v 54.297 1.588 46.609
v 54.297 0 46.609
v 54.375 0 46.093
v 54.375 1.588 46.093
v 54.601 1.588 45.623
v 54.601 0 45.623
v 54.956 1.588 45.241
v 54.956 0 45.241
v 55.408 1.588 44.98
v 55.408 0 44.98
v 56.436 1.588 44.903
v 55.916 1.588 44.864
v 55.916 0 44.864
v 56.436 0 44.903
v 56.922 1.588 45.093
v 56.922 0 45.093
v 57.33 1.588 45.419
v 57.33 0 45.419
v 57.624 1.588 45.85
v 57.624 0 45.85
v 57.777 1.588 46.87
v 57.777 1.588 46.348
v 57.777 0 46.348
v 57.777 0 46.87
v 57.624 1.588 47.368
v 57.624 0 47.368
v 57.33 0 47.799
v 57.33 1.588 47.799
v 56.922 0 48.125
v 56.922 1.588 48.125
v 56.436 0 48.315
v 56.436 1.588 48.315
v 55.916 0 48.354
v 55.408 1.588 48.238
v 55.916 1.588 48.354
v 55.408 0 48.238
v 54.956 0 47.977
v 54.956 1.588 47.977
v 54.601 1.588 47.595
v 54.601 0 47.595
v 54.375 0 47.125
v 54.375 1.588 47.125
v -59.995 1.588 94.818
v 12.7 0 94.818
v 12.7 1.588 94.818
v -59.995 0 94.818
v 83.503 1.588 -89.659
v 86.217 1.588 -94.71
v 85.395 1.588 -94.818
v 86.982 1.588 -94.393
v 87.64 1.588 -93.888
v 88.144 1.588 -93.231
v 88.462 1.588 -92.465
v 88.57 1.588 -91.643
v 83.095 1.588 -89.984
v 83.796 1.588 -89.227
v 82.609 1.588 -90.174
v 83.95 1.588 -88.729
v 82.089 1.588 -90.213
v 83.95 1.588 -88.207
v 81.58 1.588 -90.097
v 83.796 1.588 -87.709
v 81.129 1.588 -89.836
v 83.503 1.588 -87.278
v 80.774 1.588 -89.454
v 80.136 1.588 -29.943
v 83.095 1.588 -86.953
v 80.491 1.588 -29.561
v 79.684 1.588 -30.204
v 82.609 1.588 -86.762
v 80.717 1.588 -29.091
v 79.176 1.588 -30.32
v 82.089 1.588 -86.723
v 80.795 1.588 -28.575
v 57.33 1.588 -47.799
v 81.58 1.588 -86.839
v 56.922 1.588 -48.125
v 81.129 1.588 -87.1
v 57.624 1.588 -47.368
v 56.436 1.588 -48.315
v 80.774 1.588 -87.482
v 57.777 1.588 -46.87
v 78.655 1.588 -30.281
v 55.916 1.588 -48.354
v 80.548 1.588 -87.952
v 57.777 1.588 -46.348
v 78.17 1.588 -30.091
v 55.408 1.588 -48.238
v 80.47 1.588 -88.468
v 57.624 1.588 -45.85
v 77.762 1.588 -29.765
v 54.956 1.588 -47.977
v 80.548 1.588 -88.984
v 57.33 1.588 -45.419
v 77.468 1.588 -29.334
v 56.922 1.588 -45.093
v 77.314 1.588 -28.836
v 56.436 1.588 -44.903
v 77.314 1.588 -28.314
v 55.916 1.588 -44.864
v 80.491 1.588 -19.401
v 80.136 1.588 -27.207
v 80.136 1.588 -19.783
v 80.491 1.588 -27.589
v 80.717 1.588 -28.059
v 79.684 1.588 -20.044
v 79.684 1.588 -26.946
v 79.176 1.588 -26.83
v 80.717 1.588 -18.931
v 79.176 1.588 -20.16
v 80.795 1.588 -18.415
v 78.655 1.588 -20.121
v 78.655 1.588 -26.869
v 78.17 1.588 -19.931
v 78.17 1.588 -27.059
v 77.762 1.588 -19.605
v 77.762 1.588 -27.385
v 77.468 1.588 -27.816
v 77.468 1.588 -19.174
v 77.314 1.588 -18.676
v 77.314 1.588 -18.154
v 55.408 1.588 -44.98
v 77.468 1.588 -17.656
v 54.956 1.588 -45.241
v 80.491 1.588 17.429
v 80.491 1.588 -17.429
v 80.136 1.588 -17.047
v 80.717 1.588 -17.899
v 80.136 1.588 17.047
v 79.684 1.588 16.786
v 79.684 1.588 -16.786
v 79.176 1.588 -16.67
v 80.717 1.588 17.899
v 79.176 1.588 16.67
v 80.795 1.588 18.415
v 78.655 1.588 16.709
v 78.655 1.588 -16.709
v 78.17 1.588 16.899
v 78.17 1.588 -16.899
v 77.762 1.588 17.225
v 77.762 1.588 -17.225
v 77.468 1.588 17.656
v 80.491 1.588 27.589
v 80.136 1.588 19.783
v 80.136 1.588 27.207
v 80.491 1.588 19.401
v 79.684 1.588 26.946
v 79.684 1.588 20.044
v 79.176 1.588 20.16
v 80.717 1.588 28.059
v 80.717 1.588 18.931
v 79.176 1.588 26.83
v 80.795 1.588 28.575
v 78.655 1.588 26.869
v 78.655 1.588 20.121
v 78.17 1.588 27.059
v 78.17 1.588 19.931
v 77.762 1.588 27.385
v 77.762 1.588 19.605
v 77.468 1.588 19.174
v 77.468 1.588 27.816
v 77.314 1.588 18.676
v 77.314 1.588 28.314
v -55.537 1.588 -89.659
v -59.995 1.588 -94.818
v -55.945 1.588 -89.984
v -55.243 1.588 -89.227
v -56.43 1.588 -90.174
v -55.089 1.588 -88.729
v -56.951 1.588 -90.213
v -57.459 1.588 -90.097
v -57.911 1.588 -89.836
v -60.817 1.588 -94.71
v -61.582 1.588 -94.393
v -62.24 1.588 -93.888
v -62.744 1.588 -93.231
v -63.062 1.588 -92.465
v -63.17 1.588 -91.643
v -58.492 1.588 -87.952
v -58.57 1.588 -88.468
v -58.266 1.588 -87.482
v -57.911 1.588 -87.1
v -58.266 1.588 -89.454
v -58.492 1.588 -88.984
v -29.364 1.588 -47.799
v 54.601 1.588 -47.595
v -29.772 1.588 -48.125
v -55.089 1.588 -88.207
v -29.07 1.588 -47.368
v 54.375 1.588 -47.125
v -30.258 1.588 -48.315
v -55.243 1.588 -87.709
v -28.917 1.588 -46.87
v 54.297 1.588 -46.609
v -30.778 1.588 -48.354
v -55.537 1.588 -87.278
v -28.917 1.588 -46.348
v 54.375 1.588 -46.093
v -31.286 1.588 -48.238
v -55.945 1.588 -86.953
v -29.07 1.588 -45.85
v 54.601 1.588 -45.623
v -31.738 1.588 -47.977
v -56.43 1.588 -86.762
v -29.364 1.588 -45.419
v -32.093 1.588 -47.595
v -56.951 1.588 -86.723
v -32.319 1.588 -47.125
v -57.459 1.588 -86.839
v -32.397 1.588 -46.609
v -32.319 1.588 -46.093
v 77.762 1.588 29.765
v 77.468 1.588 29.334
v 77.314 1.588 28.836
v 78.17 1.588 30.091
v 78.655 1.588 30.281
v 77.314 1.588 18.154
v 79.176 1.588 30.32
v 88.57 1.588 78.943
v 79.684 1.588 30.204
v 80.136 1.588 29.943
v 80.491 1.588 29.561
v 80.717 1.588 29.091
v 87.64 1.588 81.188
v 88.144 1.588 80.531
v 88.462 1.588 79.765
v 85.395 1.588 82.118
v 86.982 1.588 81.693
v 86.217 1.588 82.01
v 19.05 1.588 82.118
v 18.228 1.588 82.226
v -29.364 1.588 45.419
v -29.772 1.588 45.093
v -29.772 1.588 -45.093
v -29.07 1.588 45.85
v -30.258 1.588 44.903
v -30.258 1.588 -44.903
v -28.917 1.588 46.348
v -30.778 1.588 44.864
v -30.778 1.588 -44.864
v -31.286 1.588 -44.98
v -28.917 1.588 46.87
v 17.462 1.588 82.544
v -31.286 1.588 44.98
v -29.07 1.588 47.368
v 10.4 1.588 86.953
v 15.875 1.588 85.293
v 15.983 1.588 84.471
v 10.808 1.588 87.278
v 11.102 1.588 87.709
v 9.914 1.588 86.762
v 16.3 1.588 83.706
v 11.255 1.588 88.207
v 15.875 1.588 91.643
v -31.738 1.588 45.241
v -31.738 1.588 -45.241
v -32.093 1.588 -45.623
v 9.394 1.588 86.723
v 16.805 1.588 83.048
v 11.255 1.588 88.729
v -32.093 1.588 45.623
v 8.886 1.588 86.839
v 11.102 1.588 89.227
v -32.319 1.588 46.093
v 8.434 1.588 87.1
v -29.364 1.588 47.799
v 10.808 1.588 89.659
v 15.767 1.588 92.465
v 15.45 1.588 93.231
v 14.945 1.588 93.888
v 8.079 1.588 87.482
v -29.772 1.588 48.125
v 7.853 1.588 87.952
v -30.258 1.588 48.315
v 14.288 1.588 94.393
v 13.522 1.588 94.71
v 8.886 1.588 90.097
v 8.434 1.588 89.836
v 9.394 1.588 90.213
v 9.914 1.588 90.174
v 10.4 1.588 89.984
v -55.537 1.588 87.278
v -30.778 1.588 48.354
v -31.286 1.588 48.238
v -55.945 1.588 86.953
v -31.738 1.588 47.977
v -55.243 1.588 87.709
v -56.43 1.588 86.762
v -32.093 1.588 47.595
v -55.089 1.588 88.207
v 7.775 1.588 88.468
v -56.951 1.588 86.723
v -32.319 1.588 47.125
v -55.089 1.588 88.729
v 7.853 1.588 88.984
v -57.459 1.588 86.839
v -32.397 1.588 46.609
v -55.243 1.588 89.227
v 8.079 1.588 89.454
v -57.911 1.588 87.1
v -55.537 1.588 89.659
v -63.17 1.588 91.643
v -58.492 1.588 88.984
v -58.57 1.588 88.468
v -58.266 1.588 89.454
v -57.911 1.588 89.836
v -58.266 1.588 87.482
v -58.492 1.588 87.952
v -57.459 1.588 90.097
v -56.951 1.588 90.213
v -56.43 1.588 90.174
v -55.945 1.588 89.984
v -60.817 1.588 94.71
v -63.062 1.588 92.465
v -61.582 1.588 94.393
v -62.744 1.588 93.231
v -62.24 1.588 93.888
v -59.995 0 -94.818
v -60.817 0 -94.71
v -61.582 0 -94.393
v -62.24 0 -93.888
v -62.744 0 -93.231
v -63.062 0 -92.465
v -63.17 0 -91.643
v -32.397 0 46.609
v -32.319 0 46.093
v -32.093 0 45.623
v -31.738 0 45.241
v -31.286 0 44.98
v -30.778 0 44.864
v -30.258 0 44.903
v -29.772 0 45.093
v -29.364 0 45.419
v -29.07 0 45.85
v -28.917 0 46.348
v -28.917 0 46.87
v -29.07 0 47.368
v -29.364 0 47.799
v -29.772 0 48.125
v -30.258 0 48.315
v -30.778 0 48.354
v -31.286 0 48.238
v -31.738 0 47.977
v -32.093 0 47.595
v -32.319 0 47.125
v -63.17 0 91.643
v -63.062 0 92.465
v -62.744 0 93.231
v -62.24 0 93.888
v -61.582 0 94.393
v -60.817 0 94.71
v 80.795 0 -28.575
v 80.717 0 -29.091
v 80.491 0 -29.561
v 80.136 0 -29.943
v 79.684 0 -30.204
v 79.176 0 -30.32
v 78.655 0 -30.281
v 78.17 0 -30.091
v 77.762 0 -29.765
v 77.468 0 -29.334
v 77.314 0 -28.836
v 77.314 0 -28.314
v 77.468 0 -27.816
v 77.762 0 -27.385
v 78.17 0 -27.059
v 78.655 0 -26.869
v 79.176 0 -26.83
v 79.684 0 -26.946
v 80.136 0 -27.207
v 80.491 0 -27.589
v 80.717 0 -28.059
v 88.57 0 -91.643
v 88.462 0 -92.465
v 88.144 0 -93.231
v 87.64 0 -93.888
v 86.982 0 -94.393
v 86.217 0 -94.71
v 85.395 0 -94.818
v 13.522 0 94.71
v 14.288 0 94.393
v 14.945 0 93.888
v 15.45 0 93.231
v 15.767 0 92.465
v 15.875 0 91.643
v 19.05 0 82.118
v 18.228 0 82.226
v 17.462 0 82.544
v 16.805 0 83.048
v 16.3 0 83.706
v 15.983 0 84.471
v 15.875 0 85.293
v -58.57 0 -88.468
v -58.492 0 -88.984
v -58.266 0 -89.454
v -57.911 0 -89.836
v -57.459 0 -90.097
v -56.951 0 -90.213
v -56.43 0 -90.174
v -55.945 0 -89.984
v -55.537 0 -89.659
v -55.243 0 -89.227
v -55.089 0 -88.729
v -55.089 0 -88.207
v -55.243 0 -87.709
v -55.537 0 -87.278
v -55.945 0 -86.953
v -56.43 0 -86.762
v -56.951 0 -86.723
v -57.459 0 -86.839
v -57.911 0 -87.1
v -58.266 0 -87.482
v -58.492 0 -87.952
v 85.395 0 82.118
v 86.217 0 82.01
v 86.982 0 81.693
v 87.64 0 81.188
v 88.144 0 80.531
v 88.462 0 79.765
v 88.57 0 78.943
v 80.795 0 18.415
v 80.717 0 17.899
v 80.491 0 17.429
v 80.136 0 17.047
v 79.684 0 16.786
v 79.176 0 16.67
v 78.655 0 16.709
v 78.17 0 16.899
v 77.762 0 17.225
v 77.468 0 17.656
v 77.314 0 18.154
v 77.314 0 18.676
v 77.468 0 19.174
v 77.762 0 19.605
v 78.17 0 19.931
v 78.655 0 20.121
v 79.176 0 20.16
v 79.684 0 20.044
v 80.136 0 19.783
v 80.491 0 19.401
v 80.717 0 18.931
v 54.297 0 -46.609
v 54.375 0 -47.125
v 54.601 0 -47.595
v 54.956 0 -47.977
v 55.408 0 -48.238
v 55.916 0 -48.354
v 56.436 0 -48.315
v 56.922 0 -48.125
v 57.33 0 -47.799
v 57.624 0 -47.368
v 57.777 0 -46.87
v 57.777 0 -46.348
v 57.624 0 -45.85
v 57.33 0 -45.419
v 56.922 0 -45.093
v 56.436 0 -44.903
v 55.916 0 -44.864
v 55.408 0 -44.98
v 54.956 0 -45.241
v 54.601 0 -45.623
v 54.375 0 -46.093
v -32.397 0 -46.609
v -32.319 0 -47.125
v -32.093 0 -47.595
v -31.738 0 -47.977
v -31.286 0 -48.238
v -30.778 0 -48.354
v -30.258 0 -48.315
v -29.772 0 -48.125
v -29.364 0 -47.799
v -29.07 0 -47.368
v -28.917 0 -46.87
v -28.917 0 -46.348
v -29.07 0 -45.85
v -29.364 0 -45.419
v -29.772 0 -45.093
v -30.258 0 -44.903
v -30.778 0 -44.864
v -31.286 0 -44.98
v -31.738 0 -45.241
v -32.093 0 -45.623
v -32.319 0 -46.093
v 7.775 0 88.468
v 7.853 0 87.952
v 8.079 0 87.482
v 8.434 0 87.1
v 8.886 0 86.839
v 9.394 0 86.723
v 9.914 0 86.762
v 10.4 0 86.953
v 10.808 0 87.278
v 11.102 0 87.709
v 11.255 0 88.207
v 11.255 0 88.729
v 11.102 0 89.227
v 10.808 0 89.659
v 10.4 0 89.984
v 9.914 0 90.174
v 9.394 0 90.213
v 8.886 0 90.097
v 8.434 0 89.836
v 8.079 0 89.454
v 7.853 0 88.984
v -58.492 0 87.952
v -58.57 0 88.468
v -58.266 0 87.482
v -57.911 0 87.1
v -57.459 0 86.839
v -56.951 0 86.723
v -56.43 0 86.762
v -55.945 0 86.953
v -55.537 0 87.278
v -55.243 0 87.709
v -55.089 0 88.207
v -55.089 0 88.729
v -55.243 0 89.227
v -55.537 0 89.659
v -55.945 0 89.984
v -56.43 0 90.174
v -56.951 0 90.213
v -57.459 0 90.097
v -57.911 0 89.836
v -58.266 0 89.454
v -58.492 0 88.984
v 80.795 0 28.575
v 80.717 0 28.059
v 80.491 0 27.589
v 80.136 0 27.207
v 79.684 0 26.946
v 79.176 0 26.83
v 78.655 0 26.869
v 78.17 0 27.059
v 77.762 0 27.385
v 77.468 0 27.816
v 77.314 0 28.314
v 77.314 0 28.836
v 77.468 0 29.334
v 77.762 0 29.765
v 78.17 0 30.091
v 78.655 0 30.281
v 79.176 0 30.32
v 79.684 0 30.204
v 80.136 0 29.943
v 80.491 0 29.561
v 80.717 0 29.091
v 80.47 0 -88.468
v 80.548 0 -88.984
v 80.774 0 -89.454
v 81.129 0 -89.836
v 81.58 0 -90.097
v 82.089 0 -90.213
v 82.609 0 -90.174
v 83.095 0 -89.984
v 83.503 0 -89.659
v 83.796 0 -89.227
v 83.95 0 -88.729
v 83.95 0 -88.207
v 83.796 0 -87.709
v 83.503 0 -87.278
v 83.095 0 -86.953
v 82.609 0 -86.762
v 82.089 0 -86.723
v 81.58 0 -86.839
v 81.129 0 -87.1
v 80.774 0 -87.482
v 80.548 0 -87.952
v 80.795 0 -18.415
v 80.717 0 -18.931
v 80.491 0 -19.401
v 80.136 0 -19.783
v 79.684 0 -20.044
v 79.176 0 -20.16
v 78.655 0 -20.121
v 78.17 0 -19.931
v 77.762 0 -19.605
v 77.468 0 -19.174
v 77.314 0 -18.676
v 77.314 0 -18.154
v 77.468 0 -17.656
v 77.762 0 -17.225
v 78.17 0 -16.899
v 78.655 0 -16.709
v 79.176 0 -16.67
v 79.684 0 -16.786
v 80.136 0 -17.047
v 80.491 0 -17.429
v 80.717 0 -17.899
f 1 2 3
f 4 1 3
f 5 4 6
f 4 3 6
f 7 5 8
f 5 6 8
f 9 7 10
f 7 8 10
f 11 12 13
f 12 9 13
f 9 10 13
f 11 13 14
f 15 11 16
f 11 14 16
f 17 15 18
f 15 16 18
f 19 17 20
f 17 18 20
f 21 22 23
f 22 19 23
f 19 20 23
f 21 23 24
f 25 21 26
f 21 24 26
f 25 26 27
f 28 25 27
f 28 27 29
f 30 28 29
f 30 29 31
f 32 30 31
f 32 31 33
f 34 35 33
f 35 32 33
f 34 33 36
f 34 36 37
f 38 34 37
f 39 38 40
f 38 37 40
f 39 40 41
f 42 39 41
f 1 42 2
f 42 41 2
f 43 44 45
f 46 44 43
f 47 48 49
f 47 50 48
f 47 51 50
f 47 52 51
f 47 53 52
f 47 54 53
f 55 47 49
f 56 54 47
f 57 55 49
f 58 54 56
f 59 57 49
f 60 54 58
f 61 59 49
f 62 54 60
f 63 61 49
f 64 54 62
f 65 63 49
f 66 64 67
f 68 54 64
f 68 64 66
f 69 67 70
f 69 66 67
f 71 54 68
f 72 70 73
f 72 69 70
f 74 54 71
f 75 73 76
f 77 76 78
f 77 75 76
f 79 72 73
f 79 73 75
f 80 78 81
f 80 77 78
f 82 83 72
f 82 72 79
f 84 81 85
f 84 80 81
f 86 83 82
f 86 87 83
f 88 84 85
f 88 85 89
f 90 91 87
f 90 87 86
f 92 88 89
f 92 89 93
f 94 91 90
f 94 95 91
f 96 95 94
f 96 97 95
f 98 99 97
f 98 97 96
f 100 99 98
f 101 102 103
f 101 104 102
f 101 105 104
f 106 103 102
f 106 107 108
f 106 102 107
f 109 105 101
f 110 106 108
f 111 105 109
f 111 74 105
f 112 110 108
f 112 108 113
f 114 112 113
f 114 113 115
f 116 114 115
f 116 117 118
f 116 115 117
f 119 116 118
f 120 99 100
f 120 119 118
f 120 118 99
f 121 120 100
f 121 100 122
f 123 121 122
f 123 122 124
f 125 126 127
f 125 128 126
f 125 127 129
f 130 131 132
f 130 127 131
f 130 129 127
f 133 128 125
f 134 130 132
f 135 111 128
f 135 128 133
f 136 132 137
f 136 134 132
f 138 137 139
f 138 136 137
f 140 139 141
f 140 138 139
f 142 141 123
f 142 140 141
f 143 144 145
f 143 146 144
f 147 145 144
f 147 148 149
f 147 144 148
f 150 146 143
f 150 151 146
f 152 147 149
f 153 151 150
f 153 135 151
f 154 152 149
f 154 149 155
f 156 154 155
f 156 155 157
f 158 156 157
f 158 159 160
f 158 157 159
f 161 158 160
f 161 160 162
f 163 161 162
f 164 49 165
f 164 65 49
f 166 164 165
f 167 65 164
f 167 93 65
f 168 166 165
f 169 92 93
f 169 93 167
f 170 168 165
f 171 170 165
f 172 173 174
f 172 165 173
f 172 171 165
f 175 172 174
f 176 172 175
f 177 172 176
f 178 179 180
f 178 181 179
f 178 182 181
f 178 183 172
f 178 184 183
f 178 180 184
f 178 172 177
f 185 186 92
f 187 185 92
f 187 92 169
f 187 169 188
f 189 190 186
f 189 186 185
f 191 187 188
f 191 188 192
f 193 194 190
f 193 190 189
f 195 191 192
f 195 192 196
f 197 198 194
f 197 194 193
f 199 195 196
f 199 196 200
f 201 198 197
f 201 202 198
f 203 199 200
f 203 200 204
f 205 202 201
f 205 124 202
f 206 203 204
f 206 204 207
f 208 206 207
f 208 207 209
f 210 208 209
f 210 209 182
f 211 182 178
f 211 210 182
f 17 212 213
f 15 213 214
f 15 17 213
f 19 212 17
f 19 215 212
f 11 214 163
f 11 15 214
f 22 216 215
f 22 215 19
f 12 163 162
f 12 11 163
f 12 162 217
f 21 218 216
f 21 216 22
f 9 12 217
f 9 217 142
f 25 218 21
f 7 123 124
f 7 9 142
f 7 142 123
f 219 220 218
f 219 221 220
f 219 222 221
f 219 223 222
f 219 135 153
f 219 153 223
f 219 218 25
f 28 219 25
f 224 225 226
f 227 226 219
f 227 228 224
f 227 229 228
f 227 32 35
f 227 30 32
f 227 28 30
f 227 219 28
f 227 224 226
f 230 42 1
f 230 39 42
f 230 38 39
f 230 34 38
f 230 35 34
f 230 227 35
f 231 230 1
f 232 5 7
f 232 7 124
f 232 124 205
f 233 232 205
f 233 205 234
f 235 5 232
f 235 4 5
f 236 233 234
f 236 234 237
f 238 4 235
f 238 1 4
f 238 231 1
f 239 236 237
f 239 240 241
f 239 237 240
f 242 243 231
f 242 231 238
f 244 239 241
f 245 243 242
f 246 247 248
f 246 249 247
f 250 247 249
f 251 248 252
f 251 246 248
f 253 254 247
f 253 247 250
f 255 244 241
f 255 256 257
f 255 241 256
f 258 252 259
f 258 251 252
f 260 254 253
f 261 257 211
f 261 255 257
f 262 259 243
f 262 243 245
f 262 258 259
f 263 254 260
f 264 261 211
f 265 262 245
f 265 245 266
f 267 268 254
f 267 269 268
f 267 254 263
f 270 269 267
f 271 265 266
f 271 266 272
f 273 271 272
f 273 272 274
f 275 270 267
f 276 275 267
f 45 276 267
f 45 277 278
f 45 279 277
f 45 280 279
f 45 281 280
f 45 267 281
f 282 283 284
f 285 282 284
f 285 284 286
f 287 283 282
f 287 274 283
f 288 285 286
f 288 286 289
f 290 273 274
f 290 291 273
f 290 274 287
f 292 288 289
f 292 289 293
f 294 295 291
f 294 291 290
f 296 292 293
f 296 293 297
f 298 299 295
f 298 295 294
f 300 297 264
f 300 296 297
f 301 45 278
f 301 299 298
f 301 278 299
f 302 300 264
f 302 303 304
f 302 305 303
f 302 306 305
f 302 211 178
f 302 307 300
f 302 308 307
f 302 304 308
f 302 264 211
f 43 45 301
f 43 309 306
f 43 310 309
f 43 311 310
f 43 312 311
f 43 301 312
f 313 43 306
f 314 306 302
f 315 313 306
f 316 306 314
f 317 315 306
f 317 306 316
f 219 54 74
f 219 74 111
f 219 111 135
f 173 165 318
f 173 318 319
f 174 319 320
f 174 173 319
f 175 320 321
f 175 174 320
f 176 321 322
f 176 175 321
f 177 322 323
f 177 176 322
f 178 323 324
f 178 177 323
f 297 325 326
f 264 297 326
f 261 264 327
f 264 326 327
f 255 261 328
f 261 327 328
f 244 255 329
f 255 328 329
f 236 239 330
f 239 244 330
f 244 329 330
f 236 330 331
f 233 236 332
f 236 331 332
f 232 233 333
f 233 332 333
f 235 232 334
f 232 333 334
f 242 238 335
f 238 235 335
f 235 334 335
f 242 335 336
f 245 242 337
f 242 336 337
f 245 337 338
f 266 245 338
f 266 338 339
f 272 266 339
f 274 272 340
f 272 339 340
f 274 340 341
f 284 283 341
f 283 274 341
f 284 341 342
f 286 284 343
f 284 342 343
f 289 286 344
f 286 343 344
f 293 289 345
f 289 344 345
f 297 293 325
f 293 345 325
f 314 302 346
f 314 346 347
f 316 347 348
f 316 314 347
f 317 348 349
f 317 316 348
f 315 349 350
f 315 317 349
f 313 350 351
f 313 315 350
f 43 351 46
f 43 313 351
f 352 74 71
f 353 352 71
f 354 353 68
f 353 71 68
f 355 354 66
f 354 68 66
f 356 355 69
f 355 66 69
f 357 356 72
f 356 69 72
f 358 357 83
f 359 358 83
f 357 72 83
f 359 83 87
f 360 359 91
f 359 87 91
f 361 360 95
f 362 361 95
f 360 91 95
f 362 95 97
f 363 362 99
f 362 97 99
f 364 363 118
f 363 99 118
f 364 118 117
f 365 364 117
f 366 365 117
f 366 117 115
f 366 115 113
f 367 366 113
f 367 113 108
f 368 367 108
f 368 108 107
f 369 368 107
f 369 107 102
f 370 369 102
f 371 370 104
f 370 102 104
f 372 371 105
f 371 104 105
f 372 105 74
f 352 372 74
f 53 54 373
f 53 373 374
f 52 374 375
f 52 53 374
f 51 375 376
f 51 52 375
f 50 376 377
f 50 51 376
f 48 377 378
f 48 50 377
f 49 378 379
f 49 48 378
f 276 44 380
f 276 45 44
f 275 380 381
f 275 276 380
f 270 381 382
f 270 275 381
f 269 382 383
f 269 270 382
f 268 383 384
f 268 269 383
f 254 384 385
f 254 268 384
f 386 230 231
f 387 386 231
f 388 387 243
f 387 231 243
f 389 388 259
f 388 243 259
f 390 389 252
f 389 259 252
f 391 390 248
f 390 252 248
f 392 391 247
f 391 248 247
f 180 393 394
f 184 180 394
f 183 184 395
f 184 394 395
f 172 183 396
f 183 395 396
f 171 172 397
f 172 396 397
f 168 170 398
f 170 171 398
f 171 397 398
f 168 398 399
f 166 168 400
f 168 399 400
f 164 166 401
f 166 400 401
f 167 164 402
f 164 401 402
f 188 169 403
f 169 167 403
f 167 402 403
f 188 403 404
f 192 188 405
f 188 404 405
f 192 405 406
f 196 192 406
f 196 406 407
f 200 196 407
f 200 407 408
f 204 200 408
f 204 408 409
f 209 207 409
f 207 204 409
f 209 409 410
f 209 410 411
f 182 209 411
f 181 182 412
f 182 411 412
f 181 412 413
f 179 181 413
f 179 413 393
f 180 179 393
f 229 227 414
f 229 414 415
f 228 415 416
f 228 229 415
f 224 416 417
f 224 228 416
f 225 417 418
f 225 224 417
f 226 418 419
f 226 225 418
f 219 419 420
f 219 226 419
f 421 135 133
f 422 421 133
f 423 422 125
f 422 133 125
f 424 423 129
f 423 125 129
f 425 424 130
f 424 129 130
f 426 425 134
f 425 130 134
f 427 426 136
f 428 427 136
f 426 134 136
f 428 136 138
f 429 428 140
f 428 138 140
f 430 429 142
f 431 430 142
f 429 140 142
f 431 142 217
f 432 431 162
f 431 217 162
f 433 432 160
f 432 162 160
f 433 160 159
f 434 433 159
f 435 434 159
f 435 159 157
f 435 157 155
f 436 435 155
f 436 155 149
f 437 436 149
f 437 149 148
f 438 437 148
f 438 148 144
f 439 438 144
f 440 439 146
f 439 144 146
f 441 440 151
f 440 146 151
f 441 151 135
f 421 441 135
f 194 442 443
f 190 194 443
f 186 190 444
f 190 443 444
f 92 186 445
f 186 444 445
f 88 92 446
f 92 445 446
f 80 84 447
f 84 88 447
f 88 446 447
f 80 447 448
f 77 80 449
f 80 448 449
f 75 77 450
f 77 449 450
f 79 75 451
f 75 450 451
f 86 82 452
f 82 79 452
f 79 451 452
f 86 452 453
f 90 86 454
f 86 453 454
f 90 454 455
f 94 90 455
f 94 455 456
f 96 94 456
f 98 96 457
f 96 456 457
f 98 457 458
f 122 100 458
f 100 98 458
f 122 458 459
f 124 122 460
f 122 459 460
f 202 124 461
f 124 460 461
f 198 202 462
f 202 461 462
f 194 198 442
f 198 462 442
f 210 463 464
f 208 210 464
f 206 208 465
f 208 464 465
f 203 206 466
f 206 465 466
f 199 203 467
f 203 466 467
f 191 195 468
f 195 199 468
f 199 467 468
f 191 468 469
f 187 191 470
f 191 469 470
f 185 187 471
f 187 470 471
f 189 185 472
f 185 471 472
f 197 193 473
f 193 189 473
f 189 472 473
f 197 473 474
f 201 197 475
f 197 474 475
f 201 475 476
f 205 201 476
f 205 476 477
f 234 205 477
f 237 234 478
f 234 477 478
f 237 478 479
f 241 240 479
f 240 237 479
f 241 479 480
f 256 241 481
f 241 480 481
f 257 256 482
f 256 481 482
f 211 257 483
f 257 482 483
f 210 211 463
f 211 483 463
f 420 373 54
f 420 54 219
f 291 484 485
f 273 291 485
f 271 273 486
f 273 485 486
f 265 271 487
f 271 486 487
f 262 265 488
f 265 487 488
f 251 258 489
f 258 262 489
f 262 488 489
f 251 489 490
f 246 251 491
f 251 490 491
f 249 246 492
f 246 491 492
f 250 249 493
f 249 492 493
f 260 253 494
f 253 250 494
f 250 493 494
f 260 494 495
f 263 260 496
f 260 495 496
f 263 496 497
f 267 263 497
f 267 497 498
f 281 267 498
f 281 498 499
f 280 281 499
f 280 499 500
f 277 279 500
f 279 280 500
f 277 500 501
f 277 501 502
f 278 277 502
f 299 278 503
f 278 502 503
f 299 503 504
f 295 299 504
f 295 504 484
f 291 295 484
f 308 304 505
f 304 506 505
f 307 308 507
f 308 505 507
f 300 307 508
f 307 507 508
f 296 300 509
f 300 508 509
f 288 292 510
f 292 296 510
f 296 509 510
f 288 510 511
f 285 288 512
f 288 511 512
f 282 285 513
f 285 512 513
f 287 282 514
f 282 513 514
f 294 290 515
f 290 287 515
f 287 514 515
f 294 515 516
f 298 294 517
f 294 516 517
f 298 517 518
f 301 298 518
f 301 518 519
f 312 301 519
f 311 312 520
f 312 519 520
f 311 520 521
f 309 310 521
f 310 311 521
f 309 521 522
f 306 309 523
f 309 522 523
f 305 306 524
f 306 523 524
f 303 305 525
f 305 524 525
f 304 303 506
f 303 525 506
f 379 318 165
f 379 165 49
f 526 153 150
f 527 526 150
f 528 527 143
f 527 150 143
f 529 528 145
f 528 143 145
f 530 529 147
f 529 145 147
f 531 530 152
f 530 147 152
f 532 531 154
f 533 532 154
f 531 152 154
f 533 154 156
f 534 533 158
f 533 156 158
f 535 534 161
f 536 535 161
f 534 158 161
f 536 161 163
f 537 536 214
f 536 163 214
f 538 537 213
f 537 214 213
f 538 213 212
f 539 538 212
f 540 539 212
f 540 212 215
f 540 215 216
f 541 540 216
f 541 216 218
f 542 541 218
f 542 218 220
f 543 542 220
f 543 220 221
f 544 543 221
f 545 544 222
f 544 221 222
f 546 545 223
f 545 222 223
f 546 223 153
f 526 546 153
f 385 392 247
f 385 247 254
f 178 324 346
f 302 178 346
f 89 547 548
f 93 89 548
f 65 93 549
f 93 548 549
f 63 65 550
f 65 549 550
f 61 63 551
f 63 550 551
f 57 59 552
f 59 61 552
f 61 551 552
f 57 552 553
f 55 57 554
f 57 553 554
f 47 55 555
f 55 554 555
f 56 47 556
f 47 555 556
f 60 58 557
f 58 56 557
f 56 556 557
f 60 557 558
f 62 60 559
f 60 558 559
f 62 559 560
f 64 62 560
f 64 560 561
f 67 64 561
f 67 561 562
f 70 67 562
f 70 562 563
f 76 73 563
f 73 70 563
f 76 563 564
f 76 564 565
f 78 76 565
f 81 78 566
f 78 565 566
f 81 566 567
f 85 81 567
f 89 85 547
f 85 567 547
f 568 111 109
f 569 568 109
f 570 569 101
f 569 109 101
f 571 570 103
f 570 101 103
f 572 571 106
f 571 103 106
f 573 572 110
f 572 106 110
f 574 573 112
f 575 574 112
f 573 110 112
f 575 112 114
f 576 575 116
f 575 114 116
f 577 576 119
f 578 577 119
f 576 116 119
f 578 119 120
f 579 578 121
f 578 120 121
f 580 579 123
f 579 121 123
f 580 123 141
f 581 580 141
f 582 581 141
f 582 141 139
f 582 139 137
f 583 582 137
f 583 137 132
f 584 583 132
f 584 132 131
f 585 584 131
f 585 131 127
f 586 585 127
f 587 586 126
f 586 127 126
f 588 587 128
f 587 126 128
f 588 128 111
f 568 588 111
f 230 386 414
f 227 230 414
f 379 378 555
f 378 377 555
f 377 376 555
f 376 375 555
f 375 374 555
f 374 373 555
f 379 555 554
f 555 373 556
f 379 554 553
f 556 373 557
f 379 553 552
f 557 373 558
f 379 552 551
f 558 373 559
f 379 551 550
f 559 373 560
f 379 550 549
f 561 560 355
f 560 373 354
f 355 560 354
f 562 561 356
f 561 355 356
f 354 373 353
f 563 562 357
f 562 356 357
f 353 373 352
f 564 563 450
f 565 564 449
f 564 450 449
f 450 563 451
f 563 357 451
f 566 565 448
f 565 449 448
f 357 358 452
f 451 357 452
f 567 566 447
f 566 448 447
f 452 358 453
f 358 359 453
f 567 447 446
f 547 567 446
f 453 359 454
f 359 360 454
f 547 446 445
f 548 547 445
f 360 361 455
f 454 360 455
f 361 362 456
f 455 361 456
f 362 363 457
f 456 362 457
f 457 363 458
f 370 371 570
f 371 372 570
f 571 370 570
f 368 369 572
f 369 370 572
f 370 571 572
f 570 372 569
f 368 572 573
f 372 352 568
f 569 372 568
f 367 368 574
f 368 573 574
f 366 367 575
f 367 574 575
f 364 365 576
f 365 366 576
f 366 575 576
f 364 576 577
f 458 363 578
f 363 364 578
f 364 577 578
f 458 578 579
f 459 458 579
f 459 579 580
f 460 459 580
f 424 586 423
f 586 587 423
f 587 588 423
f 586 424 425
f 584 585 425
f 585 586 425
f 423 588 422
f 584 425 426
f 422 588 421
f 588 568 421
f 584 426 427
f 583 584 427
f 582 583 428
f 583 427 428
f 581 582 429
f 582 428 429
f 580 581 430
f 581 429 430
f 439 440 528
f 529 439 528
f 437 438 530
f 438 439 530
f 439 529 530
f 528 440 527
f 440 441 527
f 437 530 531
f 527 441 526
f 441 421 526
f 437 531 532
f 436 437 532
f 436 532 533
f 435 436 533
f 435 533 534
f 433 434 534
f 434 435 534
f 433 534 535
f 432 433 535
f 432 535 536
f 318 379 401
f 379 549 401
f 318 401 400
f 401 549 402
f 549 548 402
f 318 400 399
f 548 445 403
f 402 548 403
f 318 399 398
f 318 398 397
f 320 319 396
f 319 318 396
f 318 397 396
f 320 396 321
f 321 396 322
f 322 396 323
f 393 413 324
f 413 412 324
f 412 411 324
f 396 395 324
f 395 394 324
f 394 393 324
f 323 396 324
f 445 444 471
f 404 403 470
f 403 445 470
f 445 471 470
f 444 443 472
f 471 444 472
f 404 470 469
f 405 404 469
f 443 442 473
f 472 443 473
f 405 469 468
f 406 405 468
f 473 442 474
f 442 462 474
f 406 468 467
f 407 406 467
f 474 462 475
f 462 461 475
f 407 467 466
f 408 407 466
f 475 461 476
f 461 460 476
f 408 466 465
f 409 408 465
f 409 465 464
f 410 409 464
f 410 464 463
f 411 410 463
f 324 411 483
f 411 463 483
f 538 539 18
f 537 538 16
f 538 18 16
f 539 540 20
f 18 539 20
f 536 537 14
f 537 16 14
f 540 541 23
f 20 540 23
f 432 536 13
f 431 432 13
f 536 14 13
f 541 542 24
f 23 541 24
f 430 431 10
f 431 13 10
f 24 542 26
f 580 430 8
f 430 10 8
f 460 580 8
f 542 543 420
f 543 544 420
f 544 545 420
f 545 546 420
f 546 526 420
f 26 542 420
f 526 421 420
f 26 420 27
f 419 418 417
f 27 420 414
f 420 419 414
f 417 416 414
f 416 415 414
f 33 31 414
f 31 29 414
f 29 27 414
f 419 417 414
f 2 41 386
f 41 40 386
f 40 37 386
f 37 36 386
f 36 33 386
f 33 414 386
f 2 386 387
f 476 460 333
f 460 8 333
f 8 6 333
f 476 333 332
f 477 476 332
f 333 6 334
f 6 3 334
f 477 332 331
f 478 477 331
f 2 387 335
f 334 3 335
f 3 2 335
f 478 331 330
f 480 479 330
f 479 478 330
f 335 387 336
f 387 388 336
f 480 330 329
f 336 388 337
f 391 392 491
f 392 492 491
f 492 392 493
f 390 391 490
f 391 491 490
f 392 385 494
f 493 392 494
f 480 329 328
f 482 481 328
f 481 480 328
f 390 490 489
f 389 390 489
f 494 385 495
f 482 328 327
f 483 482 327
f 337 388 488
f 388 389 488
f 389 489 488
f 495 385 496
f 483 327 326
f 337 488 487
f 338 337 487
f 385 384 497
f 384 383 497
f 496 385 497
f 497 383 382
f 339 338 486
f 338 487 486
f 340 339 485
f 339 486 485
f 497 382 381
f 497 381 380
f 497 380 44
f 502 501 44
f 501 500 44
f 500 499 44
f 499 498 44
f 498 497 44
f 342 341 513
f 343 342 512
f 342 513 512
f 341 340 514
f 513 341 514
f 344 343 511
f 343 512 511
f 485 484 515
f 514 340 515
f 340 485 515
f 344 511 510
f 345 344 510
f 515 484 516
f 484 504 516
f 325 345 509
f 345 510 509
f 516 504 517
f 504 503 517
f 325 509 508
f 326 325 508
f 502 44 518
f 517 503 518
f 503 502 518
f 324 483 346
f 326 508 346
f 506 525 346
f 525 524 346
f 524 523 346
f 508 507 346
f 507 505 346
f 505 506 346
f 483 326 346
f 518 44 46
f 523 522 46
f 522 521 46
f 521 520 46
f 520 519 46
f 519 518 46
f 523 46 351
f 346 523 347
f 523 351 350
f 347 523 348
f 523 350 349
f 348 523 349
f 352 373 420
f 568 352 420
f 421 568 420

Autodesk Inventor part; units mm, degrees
ref_plane "YZ Plane" through (0, 0, 0) normal (1, 0, 0) x (0, 1, 0)
ref_plane "XZ Plane" through (0, 0, 0) normal (0, 1, 0) x (-1, 0, 0)
ref_plane "XY Plane" through (0, 0, 0) normal (0, 0, 1) x (1, 0, 0)
sketch "Sketch1" plane through (0, 0, 0) normal (0, 1, 0) x (-1, 0, 0)
  line L0 (50.4698, -94.8182) -> (63.1698, -94.8182)
  line L1 (63.1698, -94.8182) -> (63.1698, -82.1182)
  line L2 (50.4698, 94.8182) -> (63.1698, 94.8182)
  line L3 (63.1698, 94.8182) -> (63.1698, 82.1182)
  circle A0 centre (56.8198, 88.4682) radius 1.75
  circle A1 centre (56.8198, -88.4682) radius 1.75
  circle A2 centre (-82.2198, -88.4682) radius 1.75
  line L4 (-15.875, 82.1182) -> (-15.875, 94.8182)
  line L5 (-15.875, 94.8182) -> (-3.175, 94.8182)
  circle A3 centre (-9.525, 88.4682) radius 1.75
  line L6 (-15.875, 94.8182) -> (63.1698, 94.8182)
  line L7 (63.1698, 94.8182) -> (63.1698, -94.8182)
  line L8 (63.1698, -94.8182) -> (-88.5698, -94.8182)
  line L9 (-15.875, 82.1182) -> (-88.5698, 82.1182)
  line L10 (-88.5698, -94.8182) -> (-88.5698, 82.1182)
  circle A4 centre (-56.047, -46.609) radius 1.75
  circle A5 centre (-56.047, -46.609) radius 1.75
  circle A6 centre (30.647, -46.609) radius 1.75
  circle A7 centre (30.647, -46.609) radius 1.75
  circle A8 centre (30.647, 46.609) radius 1.75
  circle A9 centre (30.647, 46.609) radius 1.75
  circle A10 centre (-56.047, 46.609) radius 1.75
  circle A11 centre (-56.047, 46.609) radius 1.75
  point P0 (15.9004, 85.2932)
  point P1 (63.1698, 85.2932)
  point P2 (63.1698, -85.2932)
extrude "Extrusion1" add sketch "Sketch1" along normal blind 1.5875
fillet "Fillet1" radius 3.175 6 edges at (-63.1698, 0.7937, 94.8182) (15.875, 0.7937, 94.8182) (15.875, 0.7937, 82.1182) (88.5698, 0.7937, 82.1182) (88.5698, 0.7937, -94.8182) (-63.1698, 0.7937, -94.8182)
sketch "Sketch2" plane through (0, 1.5875, 0) normal (0, 1, 0) x (1, 0, 0)
  line L0 (-63.1698, 91.6432) -> (-63.1698, -91.6432) projected
  arc A0 (-59.9948, 94.8182) -> (-63.1698, 91.6432) centre (-59.9948, 91.6432) ccw projected
  line L1 (-63.1698, 91.6432) -> (-63.1698, -91.6432)
  line L2 (88.5698, -78.9432) -> (88.5698, 91.6432) projected
  line L3 (69.5198, 0) -> (69.5198, -38.1)
  line L4 (69.5198, -38.1) -> (88.5698, -38.1)
  line L5 (88.5698, -38.1) -> (88.5698, 0)
  line L6 (88.5698, -38.1) -> (69.5198, -38.1)
  line L7 (69.5198, -38.1) -> (69.5198, 38.1)
  line L8 (69.5198, 38.1) -> (88.5698, 38.1)
  line L9 (88.5698, 38.1) -> (88.5698, -38.1)
  line L10 (69.5198, -38.1) -> (88.5698, -38.1)
  line L11 (88.5698, -38.1) -> (88.5698, -19.05)
  line L12 (69.5198, -19.05) -> (69.5198, -38.1)
  circle A1 centre (79.0448, -28.575) radius 1.75
  line L13 (69.5198, 38.1) -> (88.5698, 38.1)
  line L14 (88.5698, 38.1) -> (88.5698, 19.05)
  line L15 (69.5198, 19.05) -> (69.5198, 38.1)
  circle A2 centre (79.0448, 28.575) radius 1.75
  circle A3 centre (79.0448, -18.415) radius 1.75
  circle A4 centre (79.0448, 18.415) radius 1.75
  point P0 (0, 0)
  dimension "d3" = 19.05
  dimension "d7" = 19.05
  dimension "d8" = 3.5
  dimension "d9" = 19.05
  dimension "d10" = 3.5
  dimension "d15" = 3.5
  dimension "d16" = 3.5
extrude "Extrusion3" cut sketch "Sketch2" against normal blind 25.4 contours A1 | A2 | A3 | A4
properties part number "bottomMountingPlate2"
